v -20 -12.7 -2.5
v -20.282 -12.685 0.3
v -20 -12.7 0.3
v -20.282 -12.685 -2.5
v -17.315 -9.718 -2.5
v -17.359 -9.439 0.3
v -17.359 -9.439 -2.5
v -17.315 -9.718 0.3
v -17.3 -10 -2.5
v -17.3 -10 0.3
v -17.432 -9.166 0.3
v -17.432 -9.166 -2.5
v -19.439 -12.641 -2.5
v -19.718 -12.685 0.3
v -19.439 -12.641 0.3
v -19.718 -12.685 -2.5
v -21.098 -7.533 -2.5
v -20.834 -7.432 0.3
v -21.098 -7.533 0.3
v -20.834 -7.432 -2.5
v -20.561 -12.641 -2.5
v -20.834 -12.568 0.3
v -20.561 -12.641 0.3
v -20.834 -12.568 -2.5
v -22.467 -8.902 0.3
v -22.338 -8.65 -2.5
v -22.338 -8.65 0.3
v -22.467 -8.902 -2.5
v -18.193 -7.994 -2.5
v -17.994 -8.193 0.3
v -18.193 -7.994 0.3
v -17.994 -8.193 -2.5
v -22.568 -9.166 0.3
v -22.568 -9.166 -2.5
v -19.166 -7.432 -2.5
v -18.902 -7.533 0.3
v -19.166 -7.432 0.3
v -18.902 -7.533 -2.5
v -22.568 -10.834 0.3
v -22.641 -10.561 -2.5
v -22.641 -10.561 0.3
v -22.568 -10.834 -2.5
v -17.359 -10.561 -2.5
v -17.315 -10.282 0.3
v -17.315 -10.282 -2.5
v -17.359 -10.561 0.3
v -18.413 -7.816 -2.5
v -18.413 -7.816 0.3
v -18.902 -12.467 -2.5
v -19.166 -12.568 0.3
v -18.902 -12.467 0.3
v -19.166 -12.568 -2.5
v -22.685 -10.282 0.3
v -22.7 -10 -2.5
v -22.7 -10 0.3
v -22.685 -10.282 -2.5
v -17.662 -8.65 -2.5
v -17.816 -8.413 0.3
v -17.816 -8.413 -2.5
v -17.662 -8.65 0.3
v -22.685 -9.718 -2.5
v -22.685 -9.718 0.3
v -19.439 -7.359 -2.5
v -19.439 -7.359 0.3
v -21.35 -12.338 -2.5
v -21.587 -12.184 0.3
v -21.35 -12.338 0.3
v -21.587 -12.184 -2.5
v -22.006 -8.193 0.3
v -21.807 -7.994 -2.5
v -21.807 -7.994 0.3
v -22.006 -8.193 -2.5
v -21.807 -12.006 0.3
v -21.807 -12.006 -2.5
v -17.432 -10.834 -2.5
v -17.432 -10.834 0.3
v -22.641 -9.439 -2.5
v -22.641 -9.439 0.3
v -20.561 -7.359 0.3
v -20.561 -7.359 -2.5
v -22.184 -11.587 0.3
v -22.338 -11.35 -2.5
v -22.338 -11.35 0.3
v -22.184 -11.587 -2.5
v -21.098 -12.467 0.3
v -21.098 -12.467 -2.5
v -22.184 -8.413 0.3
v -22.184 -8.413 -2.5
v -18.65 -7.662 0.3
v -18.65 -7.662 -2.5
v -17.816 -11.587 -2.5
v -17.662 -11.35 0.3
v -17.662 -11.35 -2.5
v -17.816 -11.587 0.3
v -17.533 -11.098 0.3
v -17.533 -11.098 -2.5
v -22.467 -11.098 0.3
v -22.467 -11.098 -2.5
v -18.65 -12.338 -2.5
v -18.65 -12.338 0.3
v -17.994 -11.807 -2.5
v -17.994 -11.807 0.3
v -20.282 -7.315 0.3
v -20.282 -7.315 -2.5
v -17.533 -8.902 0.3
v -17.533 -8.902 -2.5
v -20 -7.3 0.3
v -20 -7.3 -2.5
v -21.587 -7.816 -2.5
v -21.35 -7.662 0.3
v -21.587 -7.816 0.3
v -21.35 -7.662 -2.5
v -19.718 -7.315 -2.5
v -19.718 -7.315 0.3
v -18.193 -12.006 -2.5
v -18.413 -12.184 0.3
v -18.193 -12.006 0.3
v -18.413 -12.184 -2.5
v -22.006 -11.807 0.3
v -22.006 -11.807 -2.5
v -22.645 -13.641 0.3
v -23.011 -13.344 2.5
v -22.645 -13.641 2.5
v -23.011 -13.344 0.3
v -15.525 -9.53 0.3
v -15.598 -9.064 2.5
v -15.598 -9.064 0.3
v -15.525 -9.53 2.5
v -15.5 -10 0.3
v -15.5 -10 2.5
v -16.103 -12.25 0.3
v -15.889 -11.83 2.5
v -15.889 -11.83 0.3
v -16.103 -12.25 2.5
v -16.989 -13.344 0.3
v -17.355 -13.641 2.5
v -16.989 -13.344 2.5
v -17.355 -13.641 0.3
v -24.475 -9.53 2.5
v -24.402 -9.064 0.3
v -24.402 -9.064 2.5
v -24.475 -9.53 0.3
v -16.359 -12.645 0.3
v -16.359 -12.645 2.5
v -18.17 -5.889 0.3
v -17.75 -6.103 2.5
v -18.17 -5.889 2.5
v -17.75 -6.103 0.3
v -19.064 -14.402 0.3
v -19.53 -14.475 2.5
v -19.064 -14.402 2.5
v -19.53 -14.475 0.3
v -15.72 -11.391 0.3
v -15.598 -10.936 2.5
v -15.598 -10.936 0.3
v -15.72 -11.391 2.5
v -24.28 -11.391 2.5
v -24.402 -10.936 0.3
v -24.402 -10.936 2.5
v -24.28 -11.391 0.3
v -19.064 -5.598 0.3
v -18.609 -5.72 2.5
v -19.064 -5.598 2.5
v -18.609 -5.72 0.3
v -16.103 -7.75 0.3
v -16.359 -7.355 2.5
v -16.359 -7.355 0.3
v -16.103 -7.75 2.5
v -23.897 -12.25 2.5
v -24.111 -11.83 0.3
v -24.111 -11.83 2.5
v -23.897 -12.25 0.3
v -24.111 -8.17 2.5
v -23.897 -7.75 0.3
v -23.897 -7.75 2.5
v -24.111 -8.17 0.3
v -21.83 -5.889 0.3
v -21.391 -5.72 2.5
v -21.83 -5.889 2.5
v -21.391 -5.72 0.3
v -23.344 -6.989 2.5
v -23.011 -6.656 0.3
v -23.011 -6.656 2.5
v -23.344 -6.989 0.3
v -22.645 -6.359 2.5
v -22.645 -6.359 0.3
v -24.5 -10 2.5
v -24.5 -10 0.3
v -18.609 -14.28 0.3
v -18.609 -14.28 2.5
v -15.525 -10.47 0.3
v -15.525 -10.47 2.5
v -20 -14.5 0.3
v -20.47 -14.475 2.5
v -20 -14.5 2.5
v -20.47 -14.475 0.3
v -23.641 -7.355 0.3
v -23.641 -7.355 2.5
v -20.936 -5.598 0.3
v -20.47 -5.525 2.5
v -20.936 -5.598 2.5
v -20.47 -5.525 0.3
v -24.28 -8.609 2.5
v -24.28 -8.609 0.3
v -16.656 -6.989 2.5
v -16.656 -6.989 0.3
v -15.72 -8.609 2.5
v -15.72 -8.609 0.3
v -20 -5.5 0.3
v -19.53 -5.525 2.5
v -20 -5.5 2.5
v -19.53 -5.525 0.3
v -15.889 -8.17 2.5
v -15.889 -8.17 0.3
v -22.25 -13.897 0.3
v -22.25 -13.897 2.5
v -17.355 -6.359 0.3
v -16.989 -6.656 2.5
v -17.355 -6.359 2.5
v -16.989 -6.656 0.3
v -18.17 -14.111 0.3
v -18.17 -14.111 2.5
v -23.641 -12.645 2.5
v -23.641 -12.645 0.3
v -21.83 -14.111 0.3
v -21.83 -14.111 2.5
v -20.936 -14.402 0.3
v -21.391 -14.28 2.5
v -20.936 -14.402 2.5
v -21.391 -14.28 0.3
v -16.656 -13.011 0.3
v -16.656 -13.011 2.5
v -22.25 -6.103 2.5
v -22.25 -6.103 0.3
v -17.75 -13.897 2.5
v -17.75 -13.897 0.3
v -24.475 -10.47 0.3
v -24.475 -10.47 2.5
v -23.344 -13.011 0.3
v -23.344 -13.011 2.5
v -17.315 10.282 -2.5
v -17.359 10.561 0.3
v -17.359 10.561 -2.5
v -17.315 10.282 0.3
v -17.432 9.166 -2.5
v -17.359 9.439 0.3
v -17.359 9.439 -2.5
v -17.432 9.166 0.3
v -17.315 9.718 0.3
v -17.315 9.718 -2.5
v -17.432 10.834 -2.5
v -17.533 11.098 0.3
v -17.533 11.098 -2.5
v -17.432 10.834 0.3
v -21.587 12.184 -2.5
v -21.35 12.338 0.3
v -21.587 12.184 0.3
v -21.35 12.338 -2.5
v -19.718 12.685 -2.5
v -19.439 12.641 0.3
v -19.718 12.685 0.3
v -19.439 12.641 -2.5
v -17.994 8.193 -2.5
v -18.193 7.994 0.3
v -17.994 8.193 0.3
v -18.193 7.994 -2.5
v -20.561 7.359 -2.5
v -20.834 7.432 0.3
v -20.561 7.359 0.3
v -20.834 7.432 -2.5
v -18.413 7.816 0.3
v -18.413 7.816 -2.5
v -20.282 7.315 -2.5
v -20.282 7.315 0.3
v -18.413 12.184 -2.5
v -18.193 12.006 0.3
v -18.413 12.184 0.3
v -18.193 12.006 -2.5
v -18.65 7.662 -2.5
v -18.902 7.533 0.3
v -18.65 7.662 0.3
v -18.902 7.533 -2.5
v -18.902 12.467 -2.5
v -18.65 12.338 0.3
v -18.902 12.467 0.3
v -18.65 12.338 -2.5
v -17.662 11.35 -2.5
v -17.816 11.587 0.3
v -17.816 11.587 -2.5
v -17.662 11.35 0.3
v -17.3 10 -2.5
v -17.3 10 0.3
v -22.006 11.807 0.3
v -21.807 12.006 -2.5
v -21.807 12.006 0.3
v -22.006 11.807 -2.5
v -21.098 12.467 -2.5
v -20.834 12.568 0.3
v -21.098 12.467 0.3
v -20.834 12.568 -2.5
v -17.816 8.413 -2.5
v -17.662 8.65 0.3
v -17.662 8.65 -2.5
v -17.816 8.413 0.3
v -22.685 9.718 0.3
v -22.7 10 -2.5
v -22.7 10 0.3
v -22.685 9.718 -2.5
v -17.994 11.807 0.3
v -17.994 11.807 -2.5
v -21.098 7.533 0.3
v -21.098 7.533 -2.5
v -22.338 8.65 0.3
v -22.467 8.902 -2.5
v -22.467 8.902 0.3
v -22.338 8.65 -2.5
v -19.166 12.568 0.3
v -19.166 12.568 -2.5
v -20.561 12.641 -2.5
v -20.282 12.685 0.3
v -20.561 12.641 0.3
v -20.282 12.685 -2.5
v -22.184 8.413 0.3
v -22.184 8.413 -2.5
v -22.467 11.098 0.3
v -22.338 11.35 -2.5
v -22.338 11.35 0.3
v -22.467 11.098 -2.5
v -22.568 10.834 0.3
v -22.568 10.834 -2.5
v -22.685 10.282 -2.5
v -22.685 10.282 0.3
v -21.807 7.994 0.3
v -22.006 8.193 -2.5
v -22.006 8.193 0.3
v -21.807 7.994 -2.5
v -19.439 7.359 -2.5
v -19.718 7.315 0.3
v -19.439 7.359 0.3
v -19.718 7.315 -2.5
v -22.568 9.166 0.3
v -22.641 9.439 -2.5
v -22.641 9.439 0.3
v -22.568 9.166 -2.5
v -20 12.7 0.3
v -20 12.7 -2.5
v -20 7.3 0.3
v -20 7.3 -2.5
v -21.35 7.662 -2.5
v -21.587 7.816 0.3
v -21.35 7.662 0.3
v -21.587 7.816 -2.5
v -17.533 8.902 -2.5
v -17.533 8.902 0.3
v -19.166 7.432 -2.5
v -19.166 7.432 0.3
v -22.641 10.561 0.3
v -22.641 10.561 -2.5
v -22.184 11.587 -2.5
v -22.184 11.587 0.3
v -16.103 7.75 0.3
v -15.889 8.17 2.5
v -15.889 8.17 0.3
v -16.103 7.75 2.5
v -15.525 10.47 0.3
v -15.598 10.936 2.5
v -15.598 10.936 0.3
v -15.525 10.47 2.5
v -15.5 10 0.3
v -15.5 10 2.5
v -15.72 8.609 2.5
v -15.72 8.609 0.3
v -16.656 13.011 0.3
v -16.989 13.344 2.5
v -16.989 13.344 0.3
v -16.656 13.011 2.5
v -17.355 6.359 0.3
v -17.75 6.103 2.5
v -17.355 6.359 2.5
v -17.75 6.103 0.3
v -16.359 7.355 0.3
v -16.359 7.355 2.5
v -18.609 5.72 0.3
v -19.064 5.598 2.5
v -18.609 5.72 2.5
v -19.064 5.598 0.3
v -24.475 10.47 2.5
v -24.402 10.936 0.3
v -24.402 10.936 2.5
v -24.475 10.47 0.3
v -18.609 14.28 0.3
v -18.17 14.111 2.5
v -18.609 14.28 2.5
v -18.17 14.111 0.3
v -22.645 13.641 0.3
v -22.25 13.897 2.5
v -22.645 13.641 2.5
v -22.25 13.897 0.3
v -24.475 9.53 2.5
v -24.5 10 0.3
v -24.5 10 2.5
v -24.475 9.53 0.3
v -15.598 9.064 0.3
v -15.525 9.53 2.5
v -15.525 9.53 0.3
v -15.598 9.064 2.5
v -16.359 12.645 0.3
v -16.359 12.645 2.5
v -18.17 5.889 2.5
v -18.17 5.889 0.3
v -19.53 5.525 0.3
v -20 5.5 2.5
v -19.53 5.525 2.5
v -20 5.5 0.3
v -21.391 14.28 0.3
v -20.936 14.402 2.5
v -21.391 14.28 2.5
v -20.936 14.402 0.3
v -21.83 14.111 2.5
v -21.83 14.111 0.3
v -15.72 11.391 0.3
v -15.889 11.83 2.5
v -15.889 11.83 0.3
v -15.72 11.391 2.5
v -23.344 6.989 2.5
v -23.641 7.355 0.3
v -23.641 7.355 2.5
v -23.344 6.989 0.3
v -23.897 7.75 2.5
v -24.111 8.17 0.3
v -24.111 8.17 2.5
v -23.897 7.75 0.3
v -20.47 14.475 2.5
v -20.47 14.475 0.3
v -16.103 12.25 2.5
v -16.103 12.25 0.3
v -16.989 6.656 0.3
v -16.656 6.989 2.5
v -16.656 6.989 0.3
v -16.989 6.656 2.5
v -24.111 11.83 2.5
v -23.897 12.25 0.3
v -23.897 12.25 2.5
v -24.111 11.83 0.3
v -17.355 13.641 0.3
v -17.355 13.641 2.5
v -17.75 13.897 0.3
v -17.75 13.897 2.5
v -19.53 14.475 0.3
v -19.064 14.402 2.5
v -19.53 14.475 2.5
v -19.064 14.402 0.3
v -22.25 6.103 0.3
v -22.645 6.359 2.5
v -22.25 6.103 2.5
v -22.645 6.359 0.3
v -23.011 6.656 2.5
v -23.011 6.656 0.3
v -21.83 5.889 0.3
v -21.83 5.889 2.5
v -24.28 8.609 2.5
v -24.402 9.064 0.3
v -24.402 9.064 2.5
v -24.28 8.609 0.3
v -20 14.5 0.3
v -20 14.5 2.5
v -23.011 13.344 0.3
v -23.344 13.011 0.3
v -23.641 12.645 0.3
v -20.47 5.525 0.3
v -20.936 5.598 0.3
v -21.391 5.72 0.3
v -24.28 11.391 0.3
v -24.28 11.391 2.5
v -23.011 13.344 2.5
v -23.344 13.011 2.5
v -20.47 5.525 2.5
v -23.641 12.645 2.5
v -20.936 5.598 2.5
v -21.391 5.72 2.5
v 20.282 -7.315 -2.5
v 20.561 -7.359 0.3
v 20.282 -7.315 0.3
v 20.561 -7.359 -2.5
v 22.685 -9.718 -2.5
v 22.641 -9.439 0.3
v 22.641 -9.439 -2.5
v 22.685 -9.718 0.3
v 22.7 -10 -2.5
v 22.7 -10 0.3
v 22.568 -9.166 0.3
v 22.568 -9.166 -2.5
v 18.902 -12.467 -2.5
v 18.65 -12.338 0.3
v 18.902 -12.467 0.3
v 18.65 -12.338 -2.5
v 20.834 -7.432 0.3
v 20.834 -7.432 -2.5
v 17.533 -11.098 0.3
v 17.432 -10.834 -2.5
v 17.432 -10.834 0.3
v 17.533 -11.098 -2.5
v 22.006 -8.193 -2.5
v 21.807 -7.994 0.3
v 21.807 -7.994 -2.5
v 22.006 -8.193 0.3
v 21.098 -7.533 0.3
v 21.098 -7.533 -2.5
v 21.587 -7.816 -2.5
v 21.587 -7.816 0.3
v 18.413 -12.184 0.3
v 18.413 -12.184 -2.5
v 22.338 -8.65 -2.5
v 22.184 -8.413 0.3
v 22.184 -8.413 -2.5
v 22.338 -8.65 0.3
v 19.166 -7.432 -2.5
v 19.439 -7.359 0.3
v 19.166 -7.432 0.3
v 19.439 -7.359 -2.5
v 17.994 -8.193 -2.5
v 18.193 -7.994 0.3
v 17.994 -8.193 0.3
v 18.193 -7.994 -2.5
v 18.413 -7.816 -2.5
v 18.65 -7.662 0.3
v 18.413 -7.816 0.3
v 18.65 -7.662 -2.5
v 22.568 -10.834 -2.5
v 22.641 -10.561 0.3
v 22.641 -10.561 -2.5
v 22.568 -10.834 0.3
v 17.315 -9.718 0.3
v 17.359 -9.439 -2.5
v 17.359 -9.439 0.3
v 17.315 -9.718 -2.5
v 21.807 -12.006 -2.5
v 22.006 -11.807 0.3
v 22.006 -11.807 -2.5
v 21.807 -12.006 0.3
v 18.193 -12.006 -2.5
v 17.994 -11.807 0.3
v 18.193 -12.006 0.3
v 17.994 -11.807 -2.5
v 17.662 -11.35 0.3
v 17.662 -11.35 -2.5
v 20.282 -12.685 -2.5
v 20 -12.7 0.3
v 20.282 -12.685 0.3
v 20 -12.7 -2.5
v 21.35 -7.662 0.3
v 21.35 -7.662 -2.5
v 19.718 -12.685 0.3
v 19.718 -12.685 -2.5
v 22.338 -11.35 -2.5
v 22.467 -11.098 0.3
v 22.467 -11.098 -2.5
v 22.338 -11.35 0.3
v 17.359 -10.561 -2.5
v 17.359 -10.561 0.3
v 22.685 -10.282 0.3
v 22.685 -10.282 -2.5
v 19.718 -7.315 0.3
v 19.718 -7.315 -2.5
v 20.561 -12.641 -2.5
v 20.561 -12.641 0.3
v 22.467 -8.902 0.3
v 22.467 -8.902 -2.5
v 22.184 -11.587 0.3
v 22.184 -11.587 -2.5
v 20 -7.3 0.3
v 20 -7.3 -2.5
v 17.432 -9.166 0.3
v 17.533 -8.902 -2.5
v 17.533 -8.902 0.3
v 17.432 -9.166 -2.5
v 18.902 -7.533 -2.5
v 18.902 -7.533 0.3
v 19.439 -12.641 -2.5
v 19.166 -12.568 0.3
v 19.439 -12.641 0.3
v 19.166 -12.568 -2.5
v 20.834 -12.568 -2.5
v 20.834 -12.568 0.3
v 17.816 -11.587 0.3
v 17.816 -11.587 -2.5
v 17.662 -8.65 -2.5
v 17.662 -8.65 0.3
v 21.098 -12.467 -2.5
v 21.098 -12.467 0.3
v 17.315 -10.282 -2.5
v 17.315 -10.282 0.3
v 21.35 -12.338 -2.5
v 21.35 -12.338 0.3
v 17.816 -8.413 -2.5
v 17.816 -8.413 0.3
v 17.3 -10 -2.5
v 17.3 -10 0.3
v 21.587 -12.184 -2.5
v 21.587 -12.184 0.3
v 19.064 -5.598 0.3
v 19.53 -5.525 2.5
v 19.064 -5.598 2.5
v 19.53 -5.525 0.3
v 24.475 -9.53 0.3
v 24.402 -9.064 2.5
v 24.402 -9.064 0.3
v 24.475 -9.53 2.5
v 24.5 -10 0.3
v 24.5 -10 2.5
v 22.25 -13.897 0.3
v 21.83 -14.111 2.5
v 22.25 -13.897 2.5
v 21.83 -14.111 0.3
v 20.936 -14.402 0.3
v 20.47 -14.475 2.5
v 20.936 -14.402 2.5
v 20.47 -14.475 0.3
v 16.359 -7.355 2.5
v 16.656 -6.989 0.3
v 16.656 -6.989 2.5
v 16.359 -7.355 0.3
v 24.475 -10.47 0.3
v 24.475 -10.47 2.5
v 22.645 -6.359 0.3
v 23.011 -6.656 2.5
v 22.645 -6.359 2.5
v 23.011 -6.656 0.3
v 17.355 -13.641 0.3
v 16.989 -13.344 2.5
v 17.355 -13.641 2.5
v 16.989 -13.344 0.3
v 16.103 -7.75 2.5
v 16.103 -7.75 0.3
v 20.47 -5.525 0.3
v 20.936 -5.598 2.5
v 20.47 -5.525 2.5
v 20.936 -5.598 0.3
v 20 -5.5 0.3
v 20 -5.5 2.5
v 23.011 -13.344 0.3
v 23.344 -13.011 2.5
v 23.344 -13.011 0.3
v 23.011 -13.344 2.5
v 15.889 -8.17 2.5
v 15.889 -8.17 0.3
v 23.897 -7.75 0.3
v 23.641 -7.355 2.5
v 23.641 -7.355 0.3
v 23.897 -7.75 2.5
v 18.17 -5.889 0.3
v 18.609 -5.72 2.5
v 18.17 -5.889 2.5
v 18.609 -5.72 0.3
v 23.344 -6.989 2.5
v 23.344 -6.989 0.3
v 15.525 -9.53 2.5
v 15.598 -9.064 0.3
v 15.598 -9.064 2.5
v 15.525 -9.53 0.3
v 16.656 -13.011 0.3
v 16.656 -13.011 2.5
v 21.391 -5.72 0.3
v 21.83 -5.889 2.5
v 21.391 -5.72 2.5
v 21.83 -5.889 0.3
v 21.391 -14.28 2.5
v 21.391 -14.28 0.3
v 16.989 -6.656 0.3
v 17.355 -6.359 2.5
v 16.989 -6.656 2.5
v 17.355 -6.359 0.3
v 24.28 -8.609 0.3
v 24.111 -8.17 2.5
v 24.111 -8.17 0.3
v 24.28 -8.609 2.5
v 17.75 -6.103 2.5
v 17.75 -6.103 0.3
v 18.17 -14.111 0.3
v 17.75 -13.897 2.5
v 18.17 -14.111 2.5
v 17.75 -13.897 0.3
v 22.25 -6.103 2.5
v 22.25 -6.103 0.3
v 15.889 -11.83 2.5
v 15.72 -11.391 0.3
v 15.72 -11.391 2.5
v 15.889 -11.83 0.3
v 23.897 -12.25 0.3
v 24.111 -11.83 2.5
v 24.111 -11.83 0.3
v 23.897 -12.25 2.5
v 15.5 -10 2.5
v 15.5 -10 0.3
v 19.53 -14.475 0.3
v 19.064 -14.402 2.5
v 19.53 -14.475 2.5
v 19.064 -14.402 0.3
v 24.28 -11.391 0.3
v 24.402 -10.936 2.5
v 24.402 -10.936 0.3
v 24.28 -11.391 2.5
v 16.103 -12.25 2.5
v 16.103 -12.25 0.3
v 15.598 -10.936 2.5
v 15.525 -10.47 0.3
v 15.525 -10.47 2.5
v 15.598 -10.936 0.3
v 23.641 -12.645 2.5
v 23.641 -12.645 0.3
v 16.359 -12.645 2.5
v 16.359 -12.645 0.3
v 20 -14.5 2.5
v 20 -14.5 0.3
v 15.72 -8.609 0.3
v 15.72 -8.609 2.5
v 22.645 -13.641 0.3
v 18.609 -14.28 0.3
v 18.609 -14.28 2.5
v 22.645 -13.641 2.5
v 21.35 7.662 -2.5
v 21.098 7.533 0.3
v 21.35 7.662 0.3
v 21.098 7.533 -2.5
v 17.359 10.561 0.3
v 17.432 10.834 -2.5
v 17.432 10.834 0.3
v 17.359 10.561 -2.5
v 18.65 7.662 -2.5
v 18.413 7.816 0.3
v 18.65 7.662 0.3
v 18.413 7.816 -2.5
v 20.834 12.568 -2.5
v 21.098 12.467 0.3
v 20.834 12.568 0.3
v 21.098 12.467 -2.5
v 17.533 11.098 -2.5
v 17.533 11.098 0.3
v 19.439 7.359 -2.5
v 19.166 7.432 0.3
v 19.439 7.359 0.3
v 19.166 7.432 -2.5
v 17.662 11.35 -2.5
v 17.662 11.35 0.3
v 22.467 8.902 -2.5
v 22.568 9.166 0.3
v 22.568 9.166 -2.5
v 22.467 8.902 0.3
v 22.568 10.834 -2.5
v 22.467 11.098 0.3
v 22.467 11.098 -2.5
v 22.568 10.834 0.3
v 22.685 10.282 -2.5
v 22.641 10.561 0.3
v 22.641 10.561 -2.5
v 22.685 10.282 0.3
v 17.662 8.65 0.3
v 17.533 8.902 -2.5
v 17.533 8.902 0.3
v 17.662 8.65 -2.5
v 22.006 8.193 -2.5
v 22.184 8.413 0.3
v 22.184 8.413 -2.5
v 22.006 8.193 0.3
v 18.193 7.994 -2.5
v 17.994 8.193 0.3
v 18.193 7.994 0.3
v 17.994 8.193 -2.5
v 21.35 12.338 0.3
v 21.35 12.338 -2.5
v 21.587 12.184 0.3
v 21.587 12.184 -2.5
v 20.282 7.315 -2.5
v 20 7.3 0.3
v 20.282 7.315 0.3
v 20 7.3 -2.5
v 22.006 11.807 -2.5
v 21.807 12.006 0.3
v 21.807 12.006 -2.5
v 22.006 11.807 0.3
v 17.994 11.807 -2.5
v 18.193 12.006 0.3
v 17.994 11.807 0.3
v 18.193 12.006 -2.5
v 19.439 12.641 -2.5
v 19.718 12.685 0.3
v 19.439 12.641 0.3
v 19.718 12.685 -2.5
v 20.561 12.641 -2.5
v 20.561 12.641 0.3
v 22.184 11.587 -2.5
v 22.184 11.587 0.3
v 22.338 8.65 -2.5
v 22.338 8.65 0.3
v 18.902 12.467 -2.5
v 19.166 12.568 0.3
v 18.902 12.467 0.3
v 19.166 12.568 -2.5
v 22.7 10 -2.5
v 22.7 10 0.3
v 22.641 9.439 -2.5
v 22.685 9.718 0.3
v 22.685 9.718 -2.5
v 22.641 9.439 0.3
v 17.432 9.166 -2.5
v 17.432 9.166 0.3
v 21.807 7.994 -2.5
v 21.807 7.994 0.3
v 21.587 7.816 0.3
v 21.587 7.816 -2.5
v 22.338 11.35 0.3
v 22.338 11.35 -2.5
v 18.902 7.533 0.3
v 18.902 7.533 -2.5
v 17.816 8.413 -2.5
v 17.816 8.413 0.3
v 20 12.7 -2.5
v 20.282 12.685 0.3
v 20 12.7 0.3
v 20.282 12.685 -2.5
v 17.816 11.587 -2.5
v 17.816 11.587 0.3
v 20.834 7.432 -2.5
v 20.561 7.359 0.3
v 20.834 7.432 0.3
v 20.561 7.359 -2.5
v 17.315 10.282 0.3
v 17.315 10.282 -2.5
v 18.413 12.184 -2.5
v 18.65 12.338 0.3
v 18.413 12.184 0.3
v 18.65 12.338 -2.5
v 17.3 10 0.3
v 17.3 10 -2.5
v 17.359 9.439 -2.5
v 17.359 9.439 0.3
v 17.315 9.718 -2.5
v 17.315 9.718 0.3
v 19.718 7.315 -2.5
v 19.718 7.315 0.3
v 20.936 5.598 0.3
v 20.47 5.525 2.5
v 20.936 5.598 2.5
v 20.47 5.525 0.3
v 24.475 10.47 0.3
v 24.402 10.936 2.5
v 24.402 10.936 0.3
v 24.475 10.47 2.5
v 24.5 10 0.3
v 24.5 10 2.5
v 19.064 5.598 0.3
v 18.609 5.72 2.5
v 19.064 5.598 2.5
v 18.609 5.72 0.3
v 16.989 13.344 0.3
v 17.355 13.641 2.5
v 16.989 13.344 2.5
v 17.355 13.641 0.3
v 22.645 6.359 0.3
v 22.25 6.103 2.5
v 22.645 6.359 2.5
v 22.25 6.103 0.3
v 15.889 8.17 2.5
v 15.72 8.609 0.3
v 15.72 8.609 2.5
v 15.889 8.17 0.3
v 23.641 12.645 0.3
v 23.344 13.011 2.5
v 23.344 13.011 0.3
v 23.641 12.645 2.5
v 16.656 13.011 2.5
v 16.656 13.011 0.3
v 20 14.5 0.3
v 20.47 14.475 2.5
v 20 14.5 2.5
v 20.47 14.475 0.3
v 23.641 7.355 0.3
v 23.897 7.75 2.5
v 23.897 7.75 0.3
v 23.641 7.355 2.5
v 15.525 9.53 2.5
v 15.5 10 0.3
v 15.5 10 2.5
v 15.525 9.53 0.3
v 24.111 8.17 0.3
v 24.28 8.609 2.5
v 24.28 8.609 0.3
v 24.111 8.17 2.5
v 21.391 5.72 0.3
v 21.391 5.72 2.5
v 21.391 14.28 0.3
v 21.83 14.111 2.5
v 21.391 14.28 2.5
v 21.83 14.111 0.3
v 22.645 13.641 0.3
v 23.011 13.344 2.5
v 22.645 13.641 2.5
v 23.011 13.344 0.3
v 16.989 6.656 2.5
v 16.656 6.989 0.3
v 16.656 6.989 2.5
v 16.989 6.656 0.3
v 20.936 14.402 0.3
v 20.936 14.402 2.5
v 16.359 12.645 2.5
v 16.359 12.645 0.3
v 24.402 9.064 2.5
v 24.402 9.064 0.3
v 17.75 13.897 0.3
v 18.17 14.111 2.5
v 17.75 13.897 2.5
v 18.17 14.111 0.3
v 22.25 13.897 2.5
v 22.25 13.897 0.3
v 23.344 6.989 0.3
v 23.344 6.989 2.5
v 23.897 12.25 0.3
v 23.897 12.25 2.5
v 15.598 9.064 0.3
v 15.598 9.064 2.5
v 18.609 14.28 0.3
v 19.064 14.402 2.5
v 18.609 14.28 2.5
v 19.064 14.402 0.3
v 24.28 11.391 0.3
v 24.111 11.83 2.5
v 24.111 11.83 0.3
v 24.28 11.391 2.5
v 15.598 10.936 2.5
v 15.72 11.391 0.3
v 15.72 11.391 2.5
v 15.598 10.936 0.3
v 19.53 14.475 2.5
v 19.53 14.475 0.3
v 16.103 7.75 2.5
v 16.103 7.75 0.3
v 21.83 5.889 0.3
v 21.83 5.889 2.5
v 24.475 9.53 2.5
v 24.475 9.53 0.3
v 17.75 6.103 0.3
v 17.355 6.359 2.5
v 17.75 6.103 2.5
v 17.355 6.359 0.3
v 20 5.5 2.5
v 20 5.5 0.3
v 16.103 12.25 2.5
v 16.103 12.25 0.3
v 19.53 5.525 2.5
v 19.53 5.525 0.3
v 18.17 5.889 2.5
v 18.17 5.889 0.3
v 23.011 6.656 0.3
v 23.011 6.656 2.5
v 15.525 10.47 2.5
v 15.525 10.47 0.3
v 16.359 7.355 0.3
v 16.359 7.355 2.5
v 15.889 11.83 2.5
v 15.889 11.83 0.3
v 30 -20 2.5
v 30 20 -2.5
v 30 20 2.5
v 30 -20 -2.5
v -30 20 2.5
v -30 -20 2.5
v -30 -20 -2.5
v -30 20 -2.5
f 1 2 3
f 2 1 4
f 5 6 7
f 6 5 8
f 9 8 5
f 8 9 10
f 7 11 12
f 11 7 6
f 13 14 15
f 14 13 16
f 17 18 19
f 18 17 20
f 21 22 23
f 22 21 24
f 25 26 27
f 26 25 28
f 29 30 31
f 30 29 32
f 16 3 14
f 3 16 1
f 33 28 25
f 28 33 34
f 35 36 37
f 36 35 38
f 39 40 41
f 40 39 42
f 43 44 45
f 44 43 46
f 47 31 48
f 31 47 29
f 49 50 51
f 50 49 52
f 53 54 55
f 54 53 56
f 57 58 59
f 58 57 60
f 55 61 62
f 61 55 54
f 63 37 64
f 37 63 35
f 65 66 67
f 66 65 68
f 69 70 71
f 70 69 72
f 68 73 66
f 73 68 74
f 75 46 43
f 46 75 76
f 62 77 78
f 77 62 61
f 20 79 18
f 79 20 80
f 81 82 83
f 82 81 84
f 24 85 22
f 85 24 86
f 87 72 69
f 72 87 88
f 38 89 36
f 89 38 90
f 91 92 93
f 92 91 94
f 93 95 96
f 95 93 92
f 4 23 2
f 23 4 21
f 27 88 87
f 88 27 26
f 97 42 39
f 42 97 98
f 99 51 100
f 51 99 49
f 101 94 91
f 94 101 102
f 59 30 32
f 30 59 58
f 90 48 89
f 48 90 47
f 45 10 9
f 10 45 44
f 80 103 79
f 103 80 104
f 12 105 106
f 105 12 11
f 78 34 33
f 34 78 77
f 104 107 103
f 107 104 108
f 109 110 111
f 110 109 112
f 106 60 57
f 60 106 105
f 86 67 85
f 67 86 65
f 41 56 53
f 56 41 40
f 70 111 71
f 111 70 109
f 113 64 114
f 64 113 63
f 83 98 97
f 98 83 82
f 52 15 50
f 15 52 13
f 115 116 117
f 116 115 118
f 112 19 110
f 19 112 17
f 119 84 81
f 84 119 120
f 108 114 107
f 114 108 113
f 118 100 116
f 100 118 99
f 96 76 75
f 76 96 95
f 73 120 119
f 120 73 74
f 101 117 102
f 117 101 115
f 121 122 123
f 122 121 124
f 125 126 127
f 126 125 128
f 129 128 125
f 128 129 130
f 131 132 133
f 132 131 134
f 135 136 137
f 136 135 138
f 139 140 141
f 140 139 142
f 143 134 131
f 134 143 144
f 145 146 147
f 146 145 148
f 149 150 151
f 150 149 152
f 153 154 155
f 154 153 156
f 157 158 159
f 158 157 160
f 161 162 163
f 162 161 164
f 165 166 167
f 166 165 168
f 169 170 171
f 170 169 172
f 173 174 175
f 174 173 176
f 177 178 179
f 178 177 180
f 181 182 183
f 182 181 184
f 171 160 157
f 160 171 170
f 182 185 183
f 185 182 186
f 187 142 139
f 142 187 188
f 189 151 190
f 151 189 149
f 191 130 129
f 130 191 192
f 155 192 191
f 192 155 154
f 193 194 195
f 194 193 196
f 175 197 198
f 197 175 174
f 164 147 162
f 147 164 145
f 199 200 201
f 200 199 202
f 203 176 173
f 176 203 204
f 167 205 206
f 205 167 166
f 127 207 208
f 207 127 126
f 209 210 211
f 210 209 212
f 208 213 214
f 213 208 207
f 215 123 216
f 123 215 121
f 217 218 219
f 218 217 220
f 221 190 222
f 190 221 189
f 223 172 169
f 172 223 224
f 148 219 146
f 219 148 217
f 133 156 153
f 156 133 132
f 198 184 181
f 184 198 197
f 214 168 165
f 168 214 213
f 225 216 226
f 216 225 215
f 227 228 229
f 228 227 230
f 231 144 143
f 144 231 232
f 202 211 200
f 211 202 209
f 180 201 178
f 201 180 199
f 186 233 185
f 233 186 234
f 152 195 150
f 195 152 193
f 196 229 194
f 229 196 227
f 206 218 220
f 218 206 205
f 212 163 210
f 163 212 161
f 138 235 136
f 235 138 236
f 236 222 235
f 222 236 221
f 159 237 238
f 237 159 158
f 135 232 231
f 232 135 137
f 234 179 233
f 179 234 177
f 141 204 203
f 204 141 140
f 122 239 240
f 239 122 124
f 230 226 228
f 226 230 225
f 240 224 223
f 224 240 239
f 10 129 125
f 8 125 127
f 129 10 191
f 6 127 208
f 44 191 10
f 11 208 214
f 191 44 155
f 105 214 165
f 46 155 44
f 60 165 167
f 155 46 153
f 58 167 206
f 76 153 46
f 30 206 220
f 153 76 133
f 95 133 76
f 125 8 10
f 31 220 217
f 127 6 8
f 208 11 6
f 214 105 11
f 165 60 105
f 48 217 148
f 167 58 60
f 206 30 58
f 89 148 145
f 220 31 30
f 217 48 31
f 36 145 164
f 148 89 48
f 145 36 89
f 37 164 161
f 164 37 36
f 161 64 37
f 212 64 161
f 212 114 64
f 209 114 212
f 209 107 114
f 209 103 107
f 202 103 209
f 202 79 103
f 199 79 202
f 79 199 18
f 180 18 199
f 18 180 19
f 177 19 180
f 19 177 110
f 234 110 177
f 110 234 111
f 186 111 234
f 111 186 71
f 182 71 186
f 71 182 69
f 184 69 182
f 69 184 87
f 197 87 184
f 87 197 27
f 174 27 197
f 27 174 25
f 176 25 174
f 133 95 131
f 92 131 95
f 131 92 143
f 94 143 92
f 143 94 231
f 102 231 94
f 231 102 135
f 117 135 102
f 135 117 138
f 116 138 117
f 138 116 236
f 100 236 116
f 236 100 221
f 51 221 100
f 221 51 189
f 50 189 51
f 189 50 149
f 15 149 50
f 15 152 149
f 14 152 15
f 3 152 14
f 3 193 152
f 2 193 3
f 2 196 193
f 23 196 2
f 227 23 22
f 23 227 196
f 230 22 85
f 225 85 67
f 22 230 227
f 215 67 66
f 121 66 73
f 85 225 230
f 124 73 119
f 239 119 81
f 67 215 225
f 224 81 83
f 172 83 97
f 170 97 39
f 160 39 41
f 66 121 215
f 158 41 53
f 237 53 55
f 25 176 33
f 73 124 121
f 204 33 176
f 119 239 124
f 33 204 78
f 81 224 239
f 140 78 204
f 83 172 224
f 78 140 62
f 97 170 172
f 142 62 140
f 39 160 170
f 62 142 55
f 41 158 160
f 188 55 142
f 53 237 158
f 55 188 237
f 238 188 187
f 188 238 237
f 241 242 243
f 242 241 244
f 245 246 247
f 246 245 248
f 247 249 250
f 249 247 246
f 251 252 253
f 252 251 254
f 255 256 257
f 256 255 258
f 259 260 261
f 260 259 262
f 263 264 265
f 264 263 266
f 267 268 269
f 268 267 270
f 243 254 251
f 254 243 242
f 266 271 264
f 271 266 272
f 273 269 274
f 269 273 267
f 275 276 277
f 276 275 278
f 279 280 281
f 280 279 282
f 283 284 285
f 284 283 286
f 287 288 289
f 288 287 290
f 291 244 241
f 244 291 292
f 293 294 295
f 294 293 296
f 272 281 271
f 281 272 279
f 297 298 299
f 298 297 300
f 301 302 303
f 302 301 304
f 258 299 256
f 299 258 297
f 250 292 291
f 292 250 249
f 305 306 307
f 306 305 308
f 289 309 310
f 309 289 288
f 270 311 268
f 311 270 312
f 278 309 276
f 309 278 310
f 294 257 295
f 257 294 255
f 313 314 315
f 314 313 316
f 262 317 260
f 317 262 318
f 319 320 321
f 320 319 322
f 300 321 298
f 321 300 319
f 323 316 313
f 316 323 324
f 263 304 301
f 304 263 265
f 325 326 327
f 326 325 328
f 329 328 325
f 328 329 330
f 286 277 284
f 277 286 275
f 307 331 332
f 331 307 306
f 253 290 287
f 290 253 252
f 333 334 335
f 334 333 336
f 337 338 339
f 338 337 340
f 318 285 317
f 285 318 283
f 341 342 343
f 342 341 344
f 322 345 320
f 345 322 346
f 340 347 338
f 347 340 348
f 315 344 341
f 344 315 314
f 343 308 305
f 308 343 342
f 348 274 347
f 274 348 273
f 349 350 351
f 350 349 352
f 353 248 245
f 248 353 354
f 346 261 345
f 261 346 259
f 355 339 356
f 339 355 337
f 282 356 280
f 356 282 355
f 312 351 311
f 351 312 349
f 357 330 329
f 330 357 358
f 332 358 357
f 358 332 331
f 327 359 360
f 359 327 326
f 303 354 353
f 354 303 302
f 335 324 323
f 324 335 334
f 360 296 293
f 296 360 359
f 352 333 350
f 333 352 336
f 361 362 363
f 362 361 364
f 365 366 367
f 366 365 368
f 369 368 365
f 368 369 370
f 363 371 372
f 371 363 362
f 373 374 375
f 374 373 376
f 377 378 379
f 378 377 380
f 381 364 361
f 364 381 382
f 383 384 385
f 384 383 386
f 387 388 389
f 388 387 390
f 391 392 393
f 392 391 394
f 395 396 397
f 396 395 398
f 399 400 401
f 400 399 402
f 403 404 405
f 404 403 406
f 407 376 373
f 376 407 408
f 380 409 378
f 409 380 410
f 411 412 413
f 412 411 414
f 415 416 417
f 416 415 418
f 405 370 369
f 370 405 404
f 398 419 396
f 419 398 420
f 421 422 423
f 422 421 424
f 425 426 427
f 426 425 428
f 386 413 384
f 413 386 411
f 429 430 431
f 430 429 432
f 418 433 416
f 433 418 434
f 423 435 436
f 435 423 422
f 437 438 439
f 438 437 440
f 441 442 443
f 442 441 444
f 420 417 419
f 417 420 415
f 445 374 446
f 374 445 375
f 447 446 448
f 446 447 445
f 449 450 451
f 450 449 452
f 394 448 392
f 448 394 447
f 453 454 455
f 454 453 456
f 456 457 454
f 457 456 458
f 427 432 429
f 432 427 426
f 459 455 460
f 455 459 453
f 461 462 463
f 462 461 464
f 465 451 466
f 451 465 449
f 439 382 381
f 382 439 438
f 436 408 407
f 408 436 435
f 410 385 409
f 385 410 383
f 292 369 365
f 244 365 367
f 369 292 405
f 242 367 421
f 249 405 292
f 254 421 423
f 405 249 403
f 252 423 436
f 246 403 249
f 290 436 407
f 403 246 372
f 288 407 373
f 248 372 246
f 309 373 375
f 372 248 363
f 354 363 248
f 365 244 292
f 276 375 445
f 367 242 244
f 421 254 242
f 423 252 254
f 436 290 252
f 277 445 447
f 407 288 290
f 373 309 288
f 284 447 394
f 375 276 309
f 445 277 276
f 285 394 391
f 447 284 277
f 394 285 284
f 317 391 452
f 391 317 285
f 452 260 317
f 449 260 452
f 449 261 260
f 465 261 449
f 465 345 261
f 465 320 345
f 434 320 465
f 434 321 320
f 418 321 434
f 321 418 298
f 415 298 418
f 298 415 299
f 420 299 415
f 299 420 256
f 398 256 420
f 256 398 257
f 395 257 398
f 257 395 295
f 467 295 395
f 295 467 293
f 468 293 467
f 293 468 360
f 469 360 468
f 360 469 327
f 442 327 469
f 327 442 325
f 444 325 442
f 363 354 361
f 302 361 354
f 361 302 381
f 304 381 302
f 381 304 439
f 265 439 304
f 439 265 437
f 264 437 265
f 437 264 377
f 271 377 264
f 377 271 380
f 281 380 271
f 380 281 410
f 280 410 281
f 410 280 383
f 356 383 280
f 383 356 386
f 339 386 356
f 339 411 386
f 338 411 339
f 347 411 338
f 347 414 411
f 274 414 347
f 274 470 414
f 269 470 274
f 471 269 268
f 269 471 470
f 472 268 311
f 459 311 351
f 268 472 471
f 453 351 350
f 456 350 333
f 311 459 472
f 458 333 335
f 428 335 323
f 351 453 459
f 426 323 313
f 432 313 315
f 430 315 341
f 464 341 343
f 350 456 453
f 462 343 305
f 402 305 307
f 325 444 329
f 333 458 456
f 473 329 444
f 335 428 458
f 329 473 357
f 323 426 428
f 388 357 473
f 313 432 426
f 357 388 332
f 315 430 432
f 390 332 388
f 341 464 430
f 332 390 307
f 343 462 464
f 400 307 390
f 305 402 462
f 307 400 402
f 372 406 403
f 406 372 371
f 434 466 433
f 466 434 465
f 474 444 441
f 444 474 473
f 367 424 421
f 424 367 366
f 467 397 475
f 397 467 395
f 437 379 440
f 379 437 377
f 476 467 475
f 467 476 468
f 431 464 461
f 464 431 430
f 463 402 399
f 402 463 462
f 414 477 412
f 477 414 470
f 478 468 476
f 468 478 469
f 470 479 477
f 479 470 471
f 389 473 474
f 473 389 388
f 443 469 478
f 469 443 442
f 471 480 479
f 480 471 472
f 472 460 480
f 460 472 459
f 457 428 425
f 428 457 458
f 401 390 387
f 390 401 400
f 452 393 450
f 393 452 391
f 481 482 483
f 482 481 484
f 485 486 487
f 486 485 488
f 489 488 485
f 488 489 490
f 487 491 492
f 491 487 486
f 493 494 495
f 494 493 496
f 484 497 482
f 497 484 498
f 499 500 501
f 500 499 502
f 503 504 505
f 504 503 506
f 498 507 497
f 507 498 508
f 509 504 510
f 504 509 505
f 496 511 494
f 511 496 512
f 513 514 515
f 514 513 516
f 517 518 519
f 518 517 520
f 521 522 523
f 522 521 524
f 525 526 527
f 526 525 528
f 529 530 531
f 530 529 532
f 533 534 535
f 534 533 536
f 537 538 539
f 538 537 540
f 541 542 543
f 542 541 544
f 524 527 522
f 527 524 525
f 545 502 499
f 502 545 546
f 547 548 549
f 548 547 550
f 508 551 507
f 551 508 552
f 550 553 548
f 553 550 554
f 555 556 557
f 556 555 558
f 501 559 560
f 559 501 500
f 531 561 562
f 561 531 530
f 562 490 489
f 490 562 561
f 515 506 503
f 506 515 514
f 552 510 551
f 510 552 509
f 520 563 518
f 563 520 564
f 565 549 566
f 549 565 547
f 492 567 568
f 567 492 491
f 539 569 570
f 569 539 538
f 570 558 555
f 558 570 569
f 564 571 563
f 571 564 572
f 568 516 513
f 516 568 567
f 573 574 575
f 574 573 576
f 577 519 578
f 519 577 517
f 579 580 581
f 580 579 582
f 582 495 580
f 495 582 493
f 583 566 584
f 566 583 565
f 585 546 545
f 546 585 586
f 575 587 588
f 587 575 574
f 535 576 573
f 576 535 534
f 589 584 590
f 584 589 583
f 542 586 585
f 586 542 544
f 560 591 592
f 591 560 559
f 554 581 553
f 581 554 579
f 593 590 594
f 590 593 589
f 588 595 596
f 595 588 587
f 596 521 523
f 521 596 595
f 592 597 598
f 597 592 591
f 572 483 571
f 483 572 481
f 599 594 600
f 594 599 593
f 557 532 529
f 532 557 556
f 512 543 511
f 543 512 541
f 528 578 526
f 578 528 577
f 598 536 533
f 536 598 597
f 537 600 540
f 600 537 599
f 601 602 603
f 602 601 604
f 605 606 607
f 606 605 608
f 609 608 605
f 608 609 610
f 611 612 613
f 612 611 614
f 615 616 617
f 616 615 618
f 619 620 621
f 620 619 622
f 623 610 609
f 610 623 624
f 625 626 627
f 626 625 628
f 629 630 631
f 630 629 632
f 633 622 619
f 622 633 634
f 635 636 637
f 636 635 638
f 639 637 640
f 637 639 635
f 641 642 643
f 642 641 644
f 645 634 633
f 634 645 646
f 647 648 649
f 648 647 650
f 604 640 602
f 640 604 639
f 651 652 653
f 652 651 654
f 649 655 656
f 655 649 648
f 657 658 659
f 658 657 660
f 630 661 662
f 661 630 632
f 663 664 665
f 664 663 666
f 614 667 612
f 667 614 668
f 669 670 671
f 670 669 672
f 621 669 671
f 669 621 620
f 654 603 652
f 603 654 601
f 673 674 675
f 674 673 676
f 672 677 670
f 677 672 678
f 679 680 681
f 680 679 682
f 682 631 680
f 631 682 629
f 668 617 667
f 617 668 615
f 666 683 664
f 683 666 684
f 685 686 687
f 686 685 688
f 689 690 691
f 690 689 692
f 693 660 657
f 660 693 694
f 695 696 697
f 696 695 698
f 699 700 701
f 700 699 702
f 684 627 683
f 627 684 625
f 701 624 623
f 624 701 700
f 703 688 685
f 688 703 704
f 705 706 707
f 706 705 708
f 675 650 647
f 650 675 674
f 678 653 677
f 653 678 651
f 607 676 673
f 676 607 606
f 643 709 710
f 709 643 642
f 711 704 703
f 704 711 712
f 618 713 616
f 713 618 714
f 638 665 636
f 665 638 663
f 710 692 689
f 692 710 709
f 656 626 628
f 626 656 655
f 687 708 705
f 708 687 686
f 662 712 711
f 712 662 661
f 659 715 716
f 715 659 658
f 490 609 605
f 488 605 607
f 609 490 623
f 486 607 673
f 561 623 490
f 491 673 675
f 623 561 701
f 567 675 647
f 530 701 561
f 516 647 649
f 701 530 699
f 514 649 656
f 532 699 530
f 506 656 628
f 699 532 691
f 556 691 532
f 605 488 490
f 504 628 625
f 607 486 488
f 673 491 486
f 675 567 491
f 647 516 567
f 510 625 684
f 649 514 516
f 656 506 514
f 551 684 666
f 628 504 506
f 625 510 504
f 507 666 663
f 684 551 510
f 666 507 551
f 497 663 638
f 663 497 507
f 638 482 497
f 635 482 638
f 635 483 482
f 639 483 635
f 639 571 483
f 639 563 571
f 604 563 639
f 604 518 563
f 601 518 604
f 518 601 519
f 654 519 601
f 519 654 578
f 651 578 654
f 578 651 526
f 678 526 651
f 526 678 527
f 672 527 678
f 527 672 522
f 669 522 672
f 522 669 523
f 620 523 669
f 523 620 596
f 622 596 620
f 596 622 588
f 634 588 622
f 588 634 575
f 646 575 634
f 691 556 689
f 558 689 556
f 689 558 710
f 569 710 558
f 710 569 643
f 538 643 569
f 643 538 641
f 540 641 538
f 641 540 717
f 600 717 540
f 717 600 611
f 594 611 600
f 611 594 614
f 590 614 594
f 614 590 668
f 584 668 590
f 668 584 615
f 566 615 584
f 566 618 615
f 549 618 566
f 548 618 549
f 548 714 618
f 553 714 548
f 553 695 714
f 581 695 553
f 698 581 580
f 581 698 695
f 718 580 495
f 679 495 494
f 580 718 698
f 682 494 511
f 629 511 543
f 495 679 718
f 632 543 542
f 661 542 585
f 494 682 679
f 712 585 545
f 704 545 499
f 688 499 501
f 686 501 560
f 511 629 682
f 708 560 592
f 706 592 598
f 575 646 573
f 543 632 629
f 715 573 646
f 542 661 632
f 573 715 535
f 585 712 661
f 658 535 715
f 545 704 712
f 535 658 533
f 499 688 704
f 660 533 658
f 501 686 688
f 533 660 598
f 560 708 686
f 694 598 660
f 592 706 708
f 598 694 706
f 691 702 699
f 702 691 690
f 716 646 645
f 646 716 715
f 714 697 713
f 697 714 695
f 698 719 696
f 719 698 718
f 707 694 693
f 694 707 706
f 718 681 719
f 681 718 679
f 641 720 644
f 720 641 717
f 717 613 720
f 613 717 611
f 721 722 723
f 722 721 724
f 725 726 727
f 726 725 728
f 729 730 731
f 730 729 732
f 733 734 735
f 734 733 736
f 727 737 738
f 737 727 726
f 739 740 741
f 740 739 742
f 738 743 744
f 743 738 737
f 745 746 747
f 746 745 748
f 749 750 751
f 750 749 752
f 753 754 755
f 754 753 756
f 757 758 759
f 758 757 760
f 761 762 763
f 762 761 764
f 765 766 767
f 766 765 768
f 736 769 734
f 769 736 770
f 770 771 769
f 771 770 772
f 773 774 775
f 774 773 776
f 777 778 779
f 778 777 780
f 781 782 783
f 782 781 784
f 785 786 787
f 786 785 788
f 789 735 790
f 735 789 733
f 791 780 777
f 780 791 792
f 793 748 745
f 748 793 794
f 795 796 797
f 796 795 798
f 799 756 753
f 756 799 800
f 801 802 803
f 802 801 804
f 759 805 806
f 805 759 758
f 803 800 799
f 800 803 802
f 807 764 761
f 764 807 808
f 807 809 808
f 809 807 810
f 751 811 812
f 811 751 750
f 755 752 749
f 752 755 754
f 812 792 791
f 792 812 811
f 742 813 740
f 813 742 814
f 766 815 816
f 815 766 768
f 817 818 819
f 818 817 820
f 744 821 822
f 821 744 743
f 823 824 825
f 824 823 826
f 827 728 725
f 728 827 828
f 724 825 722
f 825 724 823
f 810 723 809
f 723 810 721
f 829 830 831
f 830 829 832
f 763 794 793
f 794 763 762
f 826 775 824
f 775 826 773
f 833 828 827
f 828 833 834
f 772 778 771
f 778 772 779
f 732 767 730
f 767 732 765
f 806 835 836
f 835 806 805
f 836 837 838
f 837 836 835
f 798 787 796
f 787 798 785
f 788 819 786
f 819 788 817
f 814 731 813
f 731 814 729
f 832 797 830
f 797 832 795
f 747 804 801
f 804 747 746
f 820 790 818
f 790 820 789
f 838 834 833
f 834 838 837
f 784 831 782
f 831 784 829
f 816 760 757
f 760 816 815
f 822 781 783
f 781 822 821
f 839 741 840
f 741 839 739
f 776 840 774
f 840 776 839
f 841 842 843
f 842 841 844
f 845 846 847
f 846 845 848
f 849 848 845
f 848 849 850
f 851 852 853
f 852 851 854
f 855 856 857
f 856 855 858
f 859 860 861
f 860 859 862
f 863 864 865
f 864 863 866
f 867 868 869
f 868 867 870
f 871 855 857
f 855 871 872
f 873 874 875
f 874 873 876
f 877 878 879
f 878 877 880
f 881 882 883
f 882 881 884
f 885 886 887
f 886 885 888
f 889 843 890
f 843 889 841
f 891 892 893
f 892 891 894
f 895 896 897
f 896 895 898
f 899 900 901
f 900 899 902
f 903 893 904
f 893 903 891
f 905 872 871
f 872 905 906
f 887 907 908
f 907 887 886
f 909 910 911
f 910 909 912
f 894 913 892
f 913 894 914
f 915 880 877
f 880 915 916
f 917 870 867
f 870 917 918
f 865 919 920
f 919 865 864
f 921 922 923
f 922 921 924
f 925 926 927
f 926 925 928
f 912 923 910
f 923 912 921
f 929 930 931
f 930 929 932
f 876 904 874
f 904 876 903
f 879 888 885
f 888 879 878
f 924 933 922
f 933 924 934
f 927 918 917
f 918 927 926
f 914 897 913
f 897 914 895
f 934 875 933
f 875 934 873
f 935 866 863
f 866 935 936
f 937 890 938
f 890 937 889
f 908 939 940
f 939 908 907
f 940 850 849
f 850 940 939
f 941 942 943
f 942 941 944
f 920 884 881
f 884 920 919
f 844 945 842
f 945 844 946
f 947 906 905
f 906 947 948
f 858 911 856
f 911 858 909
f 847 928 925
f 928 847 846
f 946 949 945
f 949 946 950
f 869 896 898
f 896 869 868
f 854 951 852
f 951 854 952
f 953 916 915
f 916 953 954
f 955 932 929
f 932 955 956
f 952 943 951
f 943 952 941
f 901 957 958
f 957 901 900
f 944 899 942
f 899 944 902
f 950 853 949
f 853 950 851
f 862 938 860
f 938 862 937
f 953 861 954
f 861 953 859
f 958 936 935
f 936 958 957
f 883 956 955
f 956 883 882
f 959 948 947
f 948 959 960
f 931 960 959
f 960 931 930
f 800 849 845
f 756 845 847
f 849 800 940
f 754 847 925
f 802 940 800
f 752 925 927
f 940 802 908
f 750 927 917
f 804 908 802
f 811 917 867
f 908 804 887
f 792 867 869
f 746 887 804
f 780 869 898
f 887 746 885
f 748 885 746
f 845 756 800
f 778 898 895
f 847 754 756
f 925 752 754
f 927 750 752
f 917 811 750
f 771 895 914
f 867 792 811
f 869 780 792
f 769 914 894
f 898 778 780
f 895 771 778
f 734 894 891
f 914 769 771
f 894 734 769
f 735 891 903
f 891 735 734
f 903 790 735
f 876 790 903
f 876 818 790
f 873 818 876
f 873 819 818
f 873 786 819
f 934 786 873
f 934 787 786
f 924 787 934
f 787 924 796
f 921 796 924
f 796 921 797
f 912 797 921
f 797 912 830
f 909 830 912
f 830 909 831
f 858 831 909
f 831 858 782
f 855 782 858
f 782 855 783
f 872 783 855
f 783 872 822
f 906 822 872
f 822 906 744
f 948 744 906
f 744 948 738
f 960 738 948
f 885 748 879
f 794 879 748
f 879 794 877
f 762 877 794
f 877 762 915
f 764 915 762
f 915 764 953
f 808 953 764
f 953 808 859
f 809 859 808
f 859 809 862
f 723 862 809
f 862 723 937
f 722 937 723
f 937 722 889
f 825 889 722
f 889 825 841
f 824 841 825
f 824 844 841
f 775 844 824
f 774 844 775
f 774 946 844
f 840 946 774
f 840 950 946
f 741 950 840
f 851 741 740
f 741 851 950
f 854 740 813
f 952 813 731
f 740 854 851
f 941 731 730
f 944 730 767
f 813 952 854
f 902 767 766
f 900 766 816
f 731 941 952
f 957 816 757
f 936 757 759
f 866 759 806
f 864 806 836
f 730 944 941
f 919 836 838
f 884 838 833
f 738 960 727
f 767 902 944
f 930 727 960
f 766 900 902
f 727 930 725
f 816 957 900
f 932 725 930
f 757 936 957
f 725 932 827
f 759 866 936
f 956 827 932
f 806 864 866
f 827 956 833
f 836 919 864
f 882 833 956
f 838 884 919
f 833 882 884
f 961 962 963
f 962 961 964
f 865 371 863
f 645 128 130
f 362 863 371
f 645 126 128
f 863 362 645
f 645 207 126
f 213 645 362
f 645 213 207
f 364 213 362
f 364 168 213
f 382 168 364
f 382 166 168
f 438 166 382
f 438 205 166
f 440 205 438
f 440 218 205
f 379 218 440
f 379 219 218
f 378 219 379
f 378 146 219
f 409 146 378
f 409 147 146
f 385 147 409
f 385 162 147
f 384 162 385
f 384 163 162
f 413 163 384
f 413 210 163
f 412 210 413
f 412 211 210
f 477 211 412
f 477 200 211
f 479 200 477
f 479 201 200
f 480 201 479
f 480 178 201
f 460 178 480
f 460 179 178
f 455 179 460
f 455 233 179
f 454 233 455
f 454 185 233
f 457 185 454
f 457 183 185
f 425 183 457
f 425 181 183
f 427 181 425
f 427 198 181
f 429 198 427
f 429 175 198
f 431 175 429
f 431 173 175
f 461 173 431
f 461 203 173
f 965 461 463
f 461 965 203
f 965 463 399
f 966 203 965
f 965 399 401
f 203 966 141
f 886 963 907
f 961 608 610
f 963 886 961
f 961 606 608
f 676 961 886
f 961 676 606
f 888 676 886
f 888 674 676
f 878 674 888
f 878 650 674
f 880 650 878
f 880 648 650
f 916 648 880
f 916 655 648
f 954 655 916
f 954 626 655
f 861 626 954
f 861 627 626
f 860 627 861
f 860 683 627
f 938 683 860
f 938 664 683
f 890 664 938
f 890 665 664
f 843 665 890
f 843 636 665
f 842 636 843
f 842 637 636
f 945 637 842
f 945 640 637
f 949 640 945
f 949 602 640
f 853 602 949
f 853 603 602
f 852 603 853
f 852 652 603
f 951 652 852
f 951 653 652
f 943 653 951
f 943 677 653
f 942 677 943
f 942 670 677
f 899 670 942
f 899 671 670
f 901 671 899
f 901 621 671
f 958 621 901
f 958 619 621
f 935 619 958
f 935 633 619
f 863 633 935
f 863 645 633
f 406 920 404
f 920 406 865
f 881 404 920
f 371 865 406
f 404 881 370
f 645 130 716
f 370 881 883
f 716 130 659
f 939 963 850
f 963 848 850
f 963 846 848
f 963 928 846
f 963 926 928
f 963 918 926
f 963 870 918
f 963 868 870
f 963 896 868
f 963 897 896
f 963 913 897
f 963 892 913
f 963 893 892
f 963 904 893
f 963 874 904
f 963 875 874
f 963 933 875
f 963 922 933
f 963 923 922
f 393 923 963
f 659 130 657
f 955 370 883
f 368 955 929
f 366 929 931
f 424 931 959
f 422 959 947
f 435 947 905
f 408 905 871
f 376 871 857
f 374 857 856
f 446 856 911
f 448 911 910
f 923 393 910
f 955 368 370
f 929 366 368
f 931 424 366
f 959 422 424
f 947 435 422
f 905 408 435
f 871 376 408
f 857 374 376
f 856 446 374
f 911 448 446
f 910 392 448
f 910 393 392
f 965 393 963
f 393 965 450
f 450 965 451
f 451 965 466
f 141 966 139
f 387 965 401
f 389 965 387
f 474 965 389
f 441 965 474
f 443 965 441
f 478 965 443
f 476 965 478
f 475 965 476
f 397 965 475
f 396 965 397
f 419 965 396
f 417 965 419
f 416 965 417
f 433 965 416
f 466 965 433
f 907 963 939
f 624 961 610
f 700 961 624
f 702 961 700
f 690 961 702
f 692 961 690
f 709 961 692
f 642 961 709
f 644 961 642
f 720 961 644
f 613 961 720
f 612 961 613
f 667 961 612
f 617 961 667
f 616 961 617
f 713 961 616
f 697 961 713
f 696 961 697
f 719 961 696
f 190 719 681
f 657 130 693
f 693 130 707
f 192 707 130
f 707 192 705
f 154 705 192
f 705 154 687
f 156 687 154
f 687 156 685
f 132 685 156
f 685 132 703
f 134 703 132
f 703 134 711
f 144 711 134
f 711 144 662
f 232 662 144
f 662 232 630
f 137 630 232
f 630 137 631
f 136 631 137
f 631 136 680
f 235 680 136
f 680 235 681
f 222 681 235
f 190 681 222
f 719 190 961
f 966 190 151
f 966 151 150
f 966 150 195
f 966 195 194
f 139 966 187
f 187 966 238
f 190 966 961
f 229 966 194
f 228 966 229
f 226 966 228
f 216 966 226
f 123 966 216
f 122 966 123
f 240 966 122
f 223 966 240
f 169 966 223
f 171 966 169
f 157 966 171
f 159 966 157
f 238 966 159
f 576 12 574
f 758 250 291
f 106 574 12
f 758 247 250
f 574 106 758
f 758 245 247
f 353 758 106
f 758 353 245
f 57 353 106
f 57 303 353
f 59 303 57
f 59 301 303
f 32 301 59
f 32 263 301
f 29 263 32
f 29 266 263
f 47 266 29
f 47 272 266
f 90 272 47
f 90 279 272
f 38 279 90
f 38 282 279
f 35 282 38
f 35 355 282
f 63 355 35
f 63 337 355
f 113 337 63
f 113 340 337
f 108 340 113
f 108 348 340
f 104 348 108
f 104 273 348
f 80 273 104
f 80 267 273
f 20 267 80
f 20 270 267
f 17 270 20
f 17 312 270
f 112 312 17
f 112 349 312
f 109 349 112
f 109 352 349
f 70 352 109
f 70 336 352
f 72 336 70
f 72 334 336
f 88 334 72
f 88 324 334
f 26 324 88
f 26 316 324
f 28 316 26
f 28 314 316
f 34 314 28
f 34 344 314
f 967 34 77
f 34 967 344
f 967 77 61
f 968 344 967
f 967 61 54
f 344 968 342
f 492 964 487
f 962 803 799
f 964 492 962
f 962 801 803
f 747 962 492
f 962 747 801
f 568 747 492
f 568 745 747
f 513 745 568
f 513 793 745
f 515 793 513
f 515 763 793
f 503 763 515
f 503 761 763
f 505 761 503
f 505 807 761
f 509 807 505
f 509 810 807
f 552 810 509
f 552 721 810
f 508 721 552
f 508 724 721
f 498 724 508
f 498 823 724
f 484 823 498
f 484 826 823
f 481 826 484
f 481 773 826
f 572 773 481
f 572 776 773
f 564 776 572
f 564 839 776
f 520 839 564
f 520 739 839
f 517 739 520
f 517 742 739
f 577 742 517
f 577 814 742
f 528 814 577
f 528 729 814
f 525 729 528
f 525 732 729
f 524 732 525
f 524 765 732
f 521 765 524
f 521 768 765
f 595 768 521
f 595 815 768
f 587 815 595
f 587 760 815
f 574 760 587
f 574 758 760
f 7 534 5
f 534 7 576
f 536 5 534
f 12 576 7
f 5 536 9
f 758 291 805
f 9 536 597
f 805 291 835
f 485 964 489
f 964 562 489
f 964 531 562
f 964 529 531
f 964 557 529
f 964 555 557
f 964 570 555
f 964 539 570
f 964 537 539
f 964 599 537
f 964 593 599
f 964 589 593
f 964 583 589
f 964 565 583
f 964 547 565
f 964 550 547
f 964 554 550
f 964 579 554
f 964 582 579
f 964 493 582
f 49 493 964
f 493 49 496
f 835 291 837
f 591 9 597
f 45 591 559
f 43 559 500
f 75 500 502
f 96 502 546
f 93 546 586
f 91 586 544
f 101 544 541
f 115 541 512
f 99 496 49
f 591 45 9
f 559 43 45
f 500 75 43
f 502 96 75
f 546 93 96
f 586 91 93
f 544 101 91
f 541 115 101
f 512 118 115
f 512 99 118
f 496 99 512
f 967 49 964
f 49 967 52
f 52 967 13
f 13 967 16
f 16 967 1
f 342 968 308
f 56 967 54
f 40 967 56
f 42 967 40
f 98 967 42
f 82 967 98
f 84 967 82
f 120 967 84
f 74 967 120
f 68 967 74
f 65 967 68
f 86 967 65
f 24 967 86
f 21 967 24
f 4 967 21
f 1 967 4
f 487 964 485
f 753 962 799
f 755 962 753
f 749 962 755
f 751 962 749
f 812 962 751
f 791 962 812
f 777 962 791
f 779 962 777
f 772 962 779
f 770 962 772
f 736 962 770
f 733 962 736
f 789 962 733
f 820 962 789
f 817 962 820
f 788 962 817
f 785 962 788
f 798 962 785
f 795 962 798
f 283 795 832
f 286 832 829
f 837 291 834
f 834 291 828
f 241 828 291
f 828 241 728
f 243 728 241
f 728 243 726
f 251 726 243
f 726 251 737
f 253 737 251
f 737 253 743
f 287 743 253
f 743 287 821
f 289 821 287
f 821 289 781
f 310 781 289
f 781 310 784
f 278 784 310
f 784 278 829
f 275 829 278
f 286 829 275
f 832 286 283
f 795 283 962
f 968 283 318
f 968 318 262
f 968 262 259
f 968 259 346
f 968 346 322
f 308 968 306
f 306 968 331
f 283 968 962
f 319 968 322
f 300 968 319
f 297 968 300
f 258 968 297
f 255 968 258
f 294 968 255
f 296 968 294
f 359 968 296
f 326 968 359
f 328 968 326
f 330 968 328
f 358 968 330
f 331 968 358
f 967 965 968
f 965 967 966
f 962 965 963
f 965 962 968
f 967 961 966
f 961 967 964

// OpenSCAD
// 2020 joining plate 60 mm: joining plate for T-slot aluminium profiles.
$fn = 60;
eps = 0.02;
plate_l = 60;
plate_w = 40;
plate_t = 5;
hole_d = 5.4;
counterbore_d = 9;
counterbore_h = 2.2;
edge = 10;

module mounting_hole(x, y) {
    translate([x, y, -plate_t / 2 - eps]) cylinder(d = hole_d, h = plate_t + 2 * eps);
    translate([x, y, plate_t / 2 - counterbore_h]) cylinder(d = counterbore_d, h = counterbore_h + eps);
}

difference() {
    cube([plate_l, plate_w, plate_t], center = true);
    for (x = [-plate_l / 2 + edge, plate_l / 2 - edge], y = [-plate_w / 2 + edge, plate_w / 2 - edge])
        mounting_hole(x, y);
}
